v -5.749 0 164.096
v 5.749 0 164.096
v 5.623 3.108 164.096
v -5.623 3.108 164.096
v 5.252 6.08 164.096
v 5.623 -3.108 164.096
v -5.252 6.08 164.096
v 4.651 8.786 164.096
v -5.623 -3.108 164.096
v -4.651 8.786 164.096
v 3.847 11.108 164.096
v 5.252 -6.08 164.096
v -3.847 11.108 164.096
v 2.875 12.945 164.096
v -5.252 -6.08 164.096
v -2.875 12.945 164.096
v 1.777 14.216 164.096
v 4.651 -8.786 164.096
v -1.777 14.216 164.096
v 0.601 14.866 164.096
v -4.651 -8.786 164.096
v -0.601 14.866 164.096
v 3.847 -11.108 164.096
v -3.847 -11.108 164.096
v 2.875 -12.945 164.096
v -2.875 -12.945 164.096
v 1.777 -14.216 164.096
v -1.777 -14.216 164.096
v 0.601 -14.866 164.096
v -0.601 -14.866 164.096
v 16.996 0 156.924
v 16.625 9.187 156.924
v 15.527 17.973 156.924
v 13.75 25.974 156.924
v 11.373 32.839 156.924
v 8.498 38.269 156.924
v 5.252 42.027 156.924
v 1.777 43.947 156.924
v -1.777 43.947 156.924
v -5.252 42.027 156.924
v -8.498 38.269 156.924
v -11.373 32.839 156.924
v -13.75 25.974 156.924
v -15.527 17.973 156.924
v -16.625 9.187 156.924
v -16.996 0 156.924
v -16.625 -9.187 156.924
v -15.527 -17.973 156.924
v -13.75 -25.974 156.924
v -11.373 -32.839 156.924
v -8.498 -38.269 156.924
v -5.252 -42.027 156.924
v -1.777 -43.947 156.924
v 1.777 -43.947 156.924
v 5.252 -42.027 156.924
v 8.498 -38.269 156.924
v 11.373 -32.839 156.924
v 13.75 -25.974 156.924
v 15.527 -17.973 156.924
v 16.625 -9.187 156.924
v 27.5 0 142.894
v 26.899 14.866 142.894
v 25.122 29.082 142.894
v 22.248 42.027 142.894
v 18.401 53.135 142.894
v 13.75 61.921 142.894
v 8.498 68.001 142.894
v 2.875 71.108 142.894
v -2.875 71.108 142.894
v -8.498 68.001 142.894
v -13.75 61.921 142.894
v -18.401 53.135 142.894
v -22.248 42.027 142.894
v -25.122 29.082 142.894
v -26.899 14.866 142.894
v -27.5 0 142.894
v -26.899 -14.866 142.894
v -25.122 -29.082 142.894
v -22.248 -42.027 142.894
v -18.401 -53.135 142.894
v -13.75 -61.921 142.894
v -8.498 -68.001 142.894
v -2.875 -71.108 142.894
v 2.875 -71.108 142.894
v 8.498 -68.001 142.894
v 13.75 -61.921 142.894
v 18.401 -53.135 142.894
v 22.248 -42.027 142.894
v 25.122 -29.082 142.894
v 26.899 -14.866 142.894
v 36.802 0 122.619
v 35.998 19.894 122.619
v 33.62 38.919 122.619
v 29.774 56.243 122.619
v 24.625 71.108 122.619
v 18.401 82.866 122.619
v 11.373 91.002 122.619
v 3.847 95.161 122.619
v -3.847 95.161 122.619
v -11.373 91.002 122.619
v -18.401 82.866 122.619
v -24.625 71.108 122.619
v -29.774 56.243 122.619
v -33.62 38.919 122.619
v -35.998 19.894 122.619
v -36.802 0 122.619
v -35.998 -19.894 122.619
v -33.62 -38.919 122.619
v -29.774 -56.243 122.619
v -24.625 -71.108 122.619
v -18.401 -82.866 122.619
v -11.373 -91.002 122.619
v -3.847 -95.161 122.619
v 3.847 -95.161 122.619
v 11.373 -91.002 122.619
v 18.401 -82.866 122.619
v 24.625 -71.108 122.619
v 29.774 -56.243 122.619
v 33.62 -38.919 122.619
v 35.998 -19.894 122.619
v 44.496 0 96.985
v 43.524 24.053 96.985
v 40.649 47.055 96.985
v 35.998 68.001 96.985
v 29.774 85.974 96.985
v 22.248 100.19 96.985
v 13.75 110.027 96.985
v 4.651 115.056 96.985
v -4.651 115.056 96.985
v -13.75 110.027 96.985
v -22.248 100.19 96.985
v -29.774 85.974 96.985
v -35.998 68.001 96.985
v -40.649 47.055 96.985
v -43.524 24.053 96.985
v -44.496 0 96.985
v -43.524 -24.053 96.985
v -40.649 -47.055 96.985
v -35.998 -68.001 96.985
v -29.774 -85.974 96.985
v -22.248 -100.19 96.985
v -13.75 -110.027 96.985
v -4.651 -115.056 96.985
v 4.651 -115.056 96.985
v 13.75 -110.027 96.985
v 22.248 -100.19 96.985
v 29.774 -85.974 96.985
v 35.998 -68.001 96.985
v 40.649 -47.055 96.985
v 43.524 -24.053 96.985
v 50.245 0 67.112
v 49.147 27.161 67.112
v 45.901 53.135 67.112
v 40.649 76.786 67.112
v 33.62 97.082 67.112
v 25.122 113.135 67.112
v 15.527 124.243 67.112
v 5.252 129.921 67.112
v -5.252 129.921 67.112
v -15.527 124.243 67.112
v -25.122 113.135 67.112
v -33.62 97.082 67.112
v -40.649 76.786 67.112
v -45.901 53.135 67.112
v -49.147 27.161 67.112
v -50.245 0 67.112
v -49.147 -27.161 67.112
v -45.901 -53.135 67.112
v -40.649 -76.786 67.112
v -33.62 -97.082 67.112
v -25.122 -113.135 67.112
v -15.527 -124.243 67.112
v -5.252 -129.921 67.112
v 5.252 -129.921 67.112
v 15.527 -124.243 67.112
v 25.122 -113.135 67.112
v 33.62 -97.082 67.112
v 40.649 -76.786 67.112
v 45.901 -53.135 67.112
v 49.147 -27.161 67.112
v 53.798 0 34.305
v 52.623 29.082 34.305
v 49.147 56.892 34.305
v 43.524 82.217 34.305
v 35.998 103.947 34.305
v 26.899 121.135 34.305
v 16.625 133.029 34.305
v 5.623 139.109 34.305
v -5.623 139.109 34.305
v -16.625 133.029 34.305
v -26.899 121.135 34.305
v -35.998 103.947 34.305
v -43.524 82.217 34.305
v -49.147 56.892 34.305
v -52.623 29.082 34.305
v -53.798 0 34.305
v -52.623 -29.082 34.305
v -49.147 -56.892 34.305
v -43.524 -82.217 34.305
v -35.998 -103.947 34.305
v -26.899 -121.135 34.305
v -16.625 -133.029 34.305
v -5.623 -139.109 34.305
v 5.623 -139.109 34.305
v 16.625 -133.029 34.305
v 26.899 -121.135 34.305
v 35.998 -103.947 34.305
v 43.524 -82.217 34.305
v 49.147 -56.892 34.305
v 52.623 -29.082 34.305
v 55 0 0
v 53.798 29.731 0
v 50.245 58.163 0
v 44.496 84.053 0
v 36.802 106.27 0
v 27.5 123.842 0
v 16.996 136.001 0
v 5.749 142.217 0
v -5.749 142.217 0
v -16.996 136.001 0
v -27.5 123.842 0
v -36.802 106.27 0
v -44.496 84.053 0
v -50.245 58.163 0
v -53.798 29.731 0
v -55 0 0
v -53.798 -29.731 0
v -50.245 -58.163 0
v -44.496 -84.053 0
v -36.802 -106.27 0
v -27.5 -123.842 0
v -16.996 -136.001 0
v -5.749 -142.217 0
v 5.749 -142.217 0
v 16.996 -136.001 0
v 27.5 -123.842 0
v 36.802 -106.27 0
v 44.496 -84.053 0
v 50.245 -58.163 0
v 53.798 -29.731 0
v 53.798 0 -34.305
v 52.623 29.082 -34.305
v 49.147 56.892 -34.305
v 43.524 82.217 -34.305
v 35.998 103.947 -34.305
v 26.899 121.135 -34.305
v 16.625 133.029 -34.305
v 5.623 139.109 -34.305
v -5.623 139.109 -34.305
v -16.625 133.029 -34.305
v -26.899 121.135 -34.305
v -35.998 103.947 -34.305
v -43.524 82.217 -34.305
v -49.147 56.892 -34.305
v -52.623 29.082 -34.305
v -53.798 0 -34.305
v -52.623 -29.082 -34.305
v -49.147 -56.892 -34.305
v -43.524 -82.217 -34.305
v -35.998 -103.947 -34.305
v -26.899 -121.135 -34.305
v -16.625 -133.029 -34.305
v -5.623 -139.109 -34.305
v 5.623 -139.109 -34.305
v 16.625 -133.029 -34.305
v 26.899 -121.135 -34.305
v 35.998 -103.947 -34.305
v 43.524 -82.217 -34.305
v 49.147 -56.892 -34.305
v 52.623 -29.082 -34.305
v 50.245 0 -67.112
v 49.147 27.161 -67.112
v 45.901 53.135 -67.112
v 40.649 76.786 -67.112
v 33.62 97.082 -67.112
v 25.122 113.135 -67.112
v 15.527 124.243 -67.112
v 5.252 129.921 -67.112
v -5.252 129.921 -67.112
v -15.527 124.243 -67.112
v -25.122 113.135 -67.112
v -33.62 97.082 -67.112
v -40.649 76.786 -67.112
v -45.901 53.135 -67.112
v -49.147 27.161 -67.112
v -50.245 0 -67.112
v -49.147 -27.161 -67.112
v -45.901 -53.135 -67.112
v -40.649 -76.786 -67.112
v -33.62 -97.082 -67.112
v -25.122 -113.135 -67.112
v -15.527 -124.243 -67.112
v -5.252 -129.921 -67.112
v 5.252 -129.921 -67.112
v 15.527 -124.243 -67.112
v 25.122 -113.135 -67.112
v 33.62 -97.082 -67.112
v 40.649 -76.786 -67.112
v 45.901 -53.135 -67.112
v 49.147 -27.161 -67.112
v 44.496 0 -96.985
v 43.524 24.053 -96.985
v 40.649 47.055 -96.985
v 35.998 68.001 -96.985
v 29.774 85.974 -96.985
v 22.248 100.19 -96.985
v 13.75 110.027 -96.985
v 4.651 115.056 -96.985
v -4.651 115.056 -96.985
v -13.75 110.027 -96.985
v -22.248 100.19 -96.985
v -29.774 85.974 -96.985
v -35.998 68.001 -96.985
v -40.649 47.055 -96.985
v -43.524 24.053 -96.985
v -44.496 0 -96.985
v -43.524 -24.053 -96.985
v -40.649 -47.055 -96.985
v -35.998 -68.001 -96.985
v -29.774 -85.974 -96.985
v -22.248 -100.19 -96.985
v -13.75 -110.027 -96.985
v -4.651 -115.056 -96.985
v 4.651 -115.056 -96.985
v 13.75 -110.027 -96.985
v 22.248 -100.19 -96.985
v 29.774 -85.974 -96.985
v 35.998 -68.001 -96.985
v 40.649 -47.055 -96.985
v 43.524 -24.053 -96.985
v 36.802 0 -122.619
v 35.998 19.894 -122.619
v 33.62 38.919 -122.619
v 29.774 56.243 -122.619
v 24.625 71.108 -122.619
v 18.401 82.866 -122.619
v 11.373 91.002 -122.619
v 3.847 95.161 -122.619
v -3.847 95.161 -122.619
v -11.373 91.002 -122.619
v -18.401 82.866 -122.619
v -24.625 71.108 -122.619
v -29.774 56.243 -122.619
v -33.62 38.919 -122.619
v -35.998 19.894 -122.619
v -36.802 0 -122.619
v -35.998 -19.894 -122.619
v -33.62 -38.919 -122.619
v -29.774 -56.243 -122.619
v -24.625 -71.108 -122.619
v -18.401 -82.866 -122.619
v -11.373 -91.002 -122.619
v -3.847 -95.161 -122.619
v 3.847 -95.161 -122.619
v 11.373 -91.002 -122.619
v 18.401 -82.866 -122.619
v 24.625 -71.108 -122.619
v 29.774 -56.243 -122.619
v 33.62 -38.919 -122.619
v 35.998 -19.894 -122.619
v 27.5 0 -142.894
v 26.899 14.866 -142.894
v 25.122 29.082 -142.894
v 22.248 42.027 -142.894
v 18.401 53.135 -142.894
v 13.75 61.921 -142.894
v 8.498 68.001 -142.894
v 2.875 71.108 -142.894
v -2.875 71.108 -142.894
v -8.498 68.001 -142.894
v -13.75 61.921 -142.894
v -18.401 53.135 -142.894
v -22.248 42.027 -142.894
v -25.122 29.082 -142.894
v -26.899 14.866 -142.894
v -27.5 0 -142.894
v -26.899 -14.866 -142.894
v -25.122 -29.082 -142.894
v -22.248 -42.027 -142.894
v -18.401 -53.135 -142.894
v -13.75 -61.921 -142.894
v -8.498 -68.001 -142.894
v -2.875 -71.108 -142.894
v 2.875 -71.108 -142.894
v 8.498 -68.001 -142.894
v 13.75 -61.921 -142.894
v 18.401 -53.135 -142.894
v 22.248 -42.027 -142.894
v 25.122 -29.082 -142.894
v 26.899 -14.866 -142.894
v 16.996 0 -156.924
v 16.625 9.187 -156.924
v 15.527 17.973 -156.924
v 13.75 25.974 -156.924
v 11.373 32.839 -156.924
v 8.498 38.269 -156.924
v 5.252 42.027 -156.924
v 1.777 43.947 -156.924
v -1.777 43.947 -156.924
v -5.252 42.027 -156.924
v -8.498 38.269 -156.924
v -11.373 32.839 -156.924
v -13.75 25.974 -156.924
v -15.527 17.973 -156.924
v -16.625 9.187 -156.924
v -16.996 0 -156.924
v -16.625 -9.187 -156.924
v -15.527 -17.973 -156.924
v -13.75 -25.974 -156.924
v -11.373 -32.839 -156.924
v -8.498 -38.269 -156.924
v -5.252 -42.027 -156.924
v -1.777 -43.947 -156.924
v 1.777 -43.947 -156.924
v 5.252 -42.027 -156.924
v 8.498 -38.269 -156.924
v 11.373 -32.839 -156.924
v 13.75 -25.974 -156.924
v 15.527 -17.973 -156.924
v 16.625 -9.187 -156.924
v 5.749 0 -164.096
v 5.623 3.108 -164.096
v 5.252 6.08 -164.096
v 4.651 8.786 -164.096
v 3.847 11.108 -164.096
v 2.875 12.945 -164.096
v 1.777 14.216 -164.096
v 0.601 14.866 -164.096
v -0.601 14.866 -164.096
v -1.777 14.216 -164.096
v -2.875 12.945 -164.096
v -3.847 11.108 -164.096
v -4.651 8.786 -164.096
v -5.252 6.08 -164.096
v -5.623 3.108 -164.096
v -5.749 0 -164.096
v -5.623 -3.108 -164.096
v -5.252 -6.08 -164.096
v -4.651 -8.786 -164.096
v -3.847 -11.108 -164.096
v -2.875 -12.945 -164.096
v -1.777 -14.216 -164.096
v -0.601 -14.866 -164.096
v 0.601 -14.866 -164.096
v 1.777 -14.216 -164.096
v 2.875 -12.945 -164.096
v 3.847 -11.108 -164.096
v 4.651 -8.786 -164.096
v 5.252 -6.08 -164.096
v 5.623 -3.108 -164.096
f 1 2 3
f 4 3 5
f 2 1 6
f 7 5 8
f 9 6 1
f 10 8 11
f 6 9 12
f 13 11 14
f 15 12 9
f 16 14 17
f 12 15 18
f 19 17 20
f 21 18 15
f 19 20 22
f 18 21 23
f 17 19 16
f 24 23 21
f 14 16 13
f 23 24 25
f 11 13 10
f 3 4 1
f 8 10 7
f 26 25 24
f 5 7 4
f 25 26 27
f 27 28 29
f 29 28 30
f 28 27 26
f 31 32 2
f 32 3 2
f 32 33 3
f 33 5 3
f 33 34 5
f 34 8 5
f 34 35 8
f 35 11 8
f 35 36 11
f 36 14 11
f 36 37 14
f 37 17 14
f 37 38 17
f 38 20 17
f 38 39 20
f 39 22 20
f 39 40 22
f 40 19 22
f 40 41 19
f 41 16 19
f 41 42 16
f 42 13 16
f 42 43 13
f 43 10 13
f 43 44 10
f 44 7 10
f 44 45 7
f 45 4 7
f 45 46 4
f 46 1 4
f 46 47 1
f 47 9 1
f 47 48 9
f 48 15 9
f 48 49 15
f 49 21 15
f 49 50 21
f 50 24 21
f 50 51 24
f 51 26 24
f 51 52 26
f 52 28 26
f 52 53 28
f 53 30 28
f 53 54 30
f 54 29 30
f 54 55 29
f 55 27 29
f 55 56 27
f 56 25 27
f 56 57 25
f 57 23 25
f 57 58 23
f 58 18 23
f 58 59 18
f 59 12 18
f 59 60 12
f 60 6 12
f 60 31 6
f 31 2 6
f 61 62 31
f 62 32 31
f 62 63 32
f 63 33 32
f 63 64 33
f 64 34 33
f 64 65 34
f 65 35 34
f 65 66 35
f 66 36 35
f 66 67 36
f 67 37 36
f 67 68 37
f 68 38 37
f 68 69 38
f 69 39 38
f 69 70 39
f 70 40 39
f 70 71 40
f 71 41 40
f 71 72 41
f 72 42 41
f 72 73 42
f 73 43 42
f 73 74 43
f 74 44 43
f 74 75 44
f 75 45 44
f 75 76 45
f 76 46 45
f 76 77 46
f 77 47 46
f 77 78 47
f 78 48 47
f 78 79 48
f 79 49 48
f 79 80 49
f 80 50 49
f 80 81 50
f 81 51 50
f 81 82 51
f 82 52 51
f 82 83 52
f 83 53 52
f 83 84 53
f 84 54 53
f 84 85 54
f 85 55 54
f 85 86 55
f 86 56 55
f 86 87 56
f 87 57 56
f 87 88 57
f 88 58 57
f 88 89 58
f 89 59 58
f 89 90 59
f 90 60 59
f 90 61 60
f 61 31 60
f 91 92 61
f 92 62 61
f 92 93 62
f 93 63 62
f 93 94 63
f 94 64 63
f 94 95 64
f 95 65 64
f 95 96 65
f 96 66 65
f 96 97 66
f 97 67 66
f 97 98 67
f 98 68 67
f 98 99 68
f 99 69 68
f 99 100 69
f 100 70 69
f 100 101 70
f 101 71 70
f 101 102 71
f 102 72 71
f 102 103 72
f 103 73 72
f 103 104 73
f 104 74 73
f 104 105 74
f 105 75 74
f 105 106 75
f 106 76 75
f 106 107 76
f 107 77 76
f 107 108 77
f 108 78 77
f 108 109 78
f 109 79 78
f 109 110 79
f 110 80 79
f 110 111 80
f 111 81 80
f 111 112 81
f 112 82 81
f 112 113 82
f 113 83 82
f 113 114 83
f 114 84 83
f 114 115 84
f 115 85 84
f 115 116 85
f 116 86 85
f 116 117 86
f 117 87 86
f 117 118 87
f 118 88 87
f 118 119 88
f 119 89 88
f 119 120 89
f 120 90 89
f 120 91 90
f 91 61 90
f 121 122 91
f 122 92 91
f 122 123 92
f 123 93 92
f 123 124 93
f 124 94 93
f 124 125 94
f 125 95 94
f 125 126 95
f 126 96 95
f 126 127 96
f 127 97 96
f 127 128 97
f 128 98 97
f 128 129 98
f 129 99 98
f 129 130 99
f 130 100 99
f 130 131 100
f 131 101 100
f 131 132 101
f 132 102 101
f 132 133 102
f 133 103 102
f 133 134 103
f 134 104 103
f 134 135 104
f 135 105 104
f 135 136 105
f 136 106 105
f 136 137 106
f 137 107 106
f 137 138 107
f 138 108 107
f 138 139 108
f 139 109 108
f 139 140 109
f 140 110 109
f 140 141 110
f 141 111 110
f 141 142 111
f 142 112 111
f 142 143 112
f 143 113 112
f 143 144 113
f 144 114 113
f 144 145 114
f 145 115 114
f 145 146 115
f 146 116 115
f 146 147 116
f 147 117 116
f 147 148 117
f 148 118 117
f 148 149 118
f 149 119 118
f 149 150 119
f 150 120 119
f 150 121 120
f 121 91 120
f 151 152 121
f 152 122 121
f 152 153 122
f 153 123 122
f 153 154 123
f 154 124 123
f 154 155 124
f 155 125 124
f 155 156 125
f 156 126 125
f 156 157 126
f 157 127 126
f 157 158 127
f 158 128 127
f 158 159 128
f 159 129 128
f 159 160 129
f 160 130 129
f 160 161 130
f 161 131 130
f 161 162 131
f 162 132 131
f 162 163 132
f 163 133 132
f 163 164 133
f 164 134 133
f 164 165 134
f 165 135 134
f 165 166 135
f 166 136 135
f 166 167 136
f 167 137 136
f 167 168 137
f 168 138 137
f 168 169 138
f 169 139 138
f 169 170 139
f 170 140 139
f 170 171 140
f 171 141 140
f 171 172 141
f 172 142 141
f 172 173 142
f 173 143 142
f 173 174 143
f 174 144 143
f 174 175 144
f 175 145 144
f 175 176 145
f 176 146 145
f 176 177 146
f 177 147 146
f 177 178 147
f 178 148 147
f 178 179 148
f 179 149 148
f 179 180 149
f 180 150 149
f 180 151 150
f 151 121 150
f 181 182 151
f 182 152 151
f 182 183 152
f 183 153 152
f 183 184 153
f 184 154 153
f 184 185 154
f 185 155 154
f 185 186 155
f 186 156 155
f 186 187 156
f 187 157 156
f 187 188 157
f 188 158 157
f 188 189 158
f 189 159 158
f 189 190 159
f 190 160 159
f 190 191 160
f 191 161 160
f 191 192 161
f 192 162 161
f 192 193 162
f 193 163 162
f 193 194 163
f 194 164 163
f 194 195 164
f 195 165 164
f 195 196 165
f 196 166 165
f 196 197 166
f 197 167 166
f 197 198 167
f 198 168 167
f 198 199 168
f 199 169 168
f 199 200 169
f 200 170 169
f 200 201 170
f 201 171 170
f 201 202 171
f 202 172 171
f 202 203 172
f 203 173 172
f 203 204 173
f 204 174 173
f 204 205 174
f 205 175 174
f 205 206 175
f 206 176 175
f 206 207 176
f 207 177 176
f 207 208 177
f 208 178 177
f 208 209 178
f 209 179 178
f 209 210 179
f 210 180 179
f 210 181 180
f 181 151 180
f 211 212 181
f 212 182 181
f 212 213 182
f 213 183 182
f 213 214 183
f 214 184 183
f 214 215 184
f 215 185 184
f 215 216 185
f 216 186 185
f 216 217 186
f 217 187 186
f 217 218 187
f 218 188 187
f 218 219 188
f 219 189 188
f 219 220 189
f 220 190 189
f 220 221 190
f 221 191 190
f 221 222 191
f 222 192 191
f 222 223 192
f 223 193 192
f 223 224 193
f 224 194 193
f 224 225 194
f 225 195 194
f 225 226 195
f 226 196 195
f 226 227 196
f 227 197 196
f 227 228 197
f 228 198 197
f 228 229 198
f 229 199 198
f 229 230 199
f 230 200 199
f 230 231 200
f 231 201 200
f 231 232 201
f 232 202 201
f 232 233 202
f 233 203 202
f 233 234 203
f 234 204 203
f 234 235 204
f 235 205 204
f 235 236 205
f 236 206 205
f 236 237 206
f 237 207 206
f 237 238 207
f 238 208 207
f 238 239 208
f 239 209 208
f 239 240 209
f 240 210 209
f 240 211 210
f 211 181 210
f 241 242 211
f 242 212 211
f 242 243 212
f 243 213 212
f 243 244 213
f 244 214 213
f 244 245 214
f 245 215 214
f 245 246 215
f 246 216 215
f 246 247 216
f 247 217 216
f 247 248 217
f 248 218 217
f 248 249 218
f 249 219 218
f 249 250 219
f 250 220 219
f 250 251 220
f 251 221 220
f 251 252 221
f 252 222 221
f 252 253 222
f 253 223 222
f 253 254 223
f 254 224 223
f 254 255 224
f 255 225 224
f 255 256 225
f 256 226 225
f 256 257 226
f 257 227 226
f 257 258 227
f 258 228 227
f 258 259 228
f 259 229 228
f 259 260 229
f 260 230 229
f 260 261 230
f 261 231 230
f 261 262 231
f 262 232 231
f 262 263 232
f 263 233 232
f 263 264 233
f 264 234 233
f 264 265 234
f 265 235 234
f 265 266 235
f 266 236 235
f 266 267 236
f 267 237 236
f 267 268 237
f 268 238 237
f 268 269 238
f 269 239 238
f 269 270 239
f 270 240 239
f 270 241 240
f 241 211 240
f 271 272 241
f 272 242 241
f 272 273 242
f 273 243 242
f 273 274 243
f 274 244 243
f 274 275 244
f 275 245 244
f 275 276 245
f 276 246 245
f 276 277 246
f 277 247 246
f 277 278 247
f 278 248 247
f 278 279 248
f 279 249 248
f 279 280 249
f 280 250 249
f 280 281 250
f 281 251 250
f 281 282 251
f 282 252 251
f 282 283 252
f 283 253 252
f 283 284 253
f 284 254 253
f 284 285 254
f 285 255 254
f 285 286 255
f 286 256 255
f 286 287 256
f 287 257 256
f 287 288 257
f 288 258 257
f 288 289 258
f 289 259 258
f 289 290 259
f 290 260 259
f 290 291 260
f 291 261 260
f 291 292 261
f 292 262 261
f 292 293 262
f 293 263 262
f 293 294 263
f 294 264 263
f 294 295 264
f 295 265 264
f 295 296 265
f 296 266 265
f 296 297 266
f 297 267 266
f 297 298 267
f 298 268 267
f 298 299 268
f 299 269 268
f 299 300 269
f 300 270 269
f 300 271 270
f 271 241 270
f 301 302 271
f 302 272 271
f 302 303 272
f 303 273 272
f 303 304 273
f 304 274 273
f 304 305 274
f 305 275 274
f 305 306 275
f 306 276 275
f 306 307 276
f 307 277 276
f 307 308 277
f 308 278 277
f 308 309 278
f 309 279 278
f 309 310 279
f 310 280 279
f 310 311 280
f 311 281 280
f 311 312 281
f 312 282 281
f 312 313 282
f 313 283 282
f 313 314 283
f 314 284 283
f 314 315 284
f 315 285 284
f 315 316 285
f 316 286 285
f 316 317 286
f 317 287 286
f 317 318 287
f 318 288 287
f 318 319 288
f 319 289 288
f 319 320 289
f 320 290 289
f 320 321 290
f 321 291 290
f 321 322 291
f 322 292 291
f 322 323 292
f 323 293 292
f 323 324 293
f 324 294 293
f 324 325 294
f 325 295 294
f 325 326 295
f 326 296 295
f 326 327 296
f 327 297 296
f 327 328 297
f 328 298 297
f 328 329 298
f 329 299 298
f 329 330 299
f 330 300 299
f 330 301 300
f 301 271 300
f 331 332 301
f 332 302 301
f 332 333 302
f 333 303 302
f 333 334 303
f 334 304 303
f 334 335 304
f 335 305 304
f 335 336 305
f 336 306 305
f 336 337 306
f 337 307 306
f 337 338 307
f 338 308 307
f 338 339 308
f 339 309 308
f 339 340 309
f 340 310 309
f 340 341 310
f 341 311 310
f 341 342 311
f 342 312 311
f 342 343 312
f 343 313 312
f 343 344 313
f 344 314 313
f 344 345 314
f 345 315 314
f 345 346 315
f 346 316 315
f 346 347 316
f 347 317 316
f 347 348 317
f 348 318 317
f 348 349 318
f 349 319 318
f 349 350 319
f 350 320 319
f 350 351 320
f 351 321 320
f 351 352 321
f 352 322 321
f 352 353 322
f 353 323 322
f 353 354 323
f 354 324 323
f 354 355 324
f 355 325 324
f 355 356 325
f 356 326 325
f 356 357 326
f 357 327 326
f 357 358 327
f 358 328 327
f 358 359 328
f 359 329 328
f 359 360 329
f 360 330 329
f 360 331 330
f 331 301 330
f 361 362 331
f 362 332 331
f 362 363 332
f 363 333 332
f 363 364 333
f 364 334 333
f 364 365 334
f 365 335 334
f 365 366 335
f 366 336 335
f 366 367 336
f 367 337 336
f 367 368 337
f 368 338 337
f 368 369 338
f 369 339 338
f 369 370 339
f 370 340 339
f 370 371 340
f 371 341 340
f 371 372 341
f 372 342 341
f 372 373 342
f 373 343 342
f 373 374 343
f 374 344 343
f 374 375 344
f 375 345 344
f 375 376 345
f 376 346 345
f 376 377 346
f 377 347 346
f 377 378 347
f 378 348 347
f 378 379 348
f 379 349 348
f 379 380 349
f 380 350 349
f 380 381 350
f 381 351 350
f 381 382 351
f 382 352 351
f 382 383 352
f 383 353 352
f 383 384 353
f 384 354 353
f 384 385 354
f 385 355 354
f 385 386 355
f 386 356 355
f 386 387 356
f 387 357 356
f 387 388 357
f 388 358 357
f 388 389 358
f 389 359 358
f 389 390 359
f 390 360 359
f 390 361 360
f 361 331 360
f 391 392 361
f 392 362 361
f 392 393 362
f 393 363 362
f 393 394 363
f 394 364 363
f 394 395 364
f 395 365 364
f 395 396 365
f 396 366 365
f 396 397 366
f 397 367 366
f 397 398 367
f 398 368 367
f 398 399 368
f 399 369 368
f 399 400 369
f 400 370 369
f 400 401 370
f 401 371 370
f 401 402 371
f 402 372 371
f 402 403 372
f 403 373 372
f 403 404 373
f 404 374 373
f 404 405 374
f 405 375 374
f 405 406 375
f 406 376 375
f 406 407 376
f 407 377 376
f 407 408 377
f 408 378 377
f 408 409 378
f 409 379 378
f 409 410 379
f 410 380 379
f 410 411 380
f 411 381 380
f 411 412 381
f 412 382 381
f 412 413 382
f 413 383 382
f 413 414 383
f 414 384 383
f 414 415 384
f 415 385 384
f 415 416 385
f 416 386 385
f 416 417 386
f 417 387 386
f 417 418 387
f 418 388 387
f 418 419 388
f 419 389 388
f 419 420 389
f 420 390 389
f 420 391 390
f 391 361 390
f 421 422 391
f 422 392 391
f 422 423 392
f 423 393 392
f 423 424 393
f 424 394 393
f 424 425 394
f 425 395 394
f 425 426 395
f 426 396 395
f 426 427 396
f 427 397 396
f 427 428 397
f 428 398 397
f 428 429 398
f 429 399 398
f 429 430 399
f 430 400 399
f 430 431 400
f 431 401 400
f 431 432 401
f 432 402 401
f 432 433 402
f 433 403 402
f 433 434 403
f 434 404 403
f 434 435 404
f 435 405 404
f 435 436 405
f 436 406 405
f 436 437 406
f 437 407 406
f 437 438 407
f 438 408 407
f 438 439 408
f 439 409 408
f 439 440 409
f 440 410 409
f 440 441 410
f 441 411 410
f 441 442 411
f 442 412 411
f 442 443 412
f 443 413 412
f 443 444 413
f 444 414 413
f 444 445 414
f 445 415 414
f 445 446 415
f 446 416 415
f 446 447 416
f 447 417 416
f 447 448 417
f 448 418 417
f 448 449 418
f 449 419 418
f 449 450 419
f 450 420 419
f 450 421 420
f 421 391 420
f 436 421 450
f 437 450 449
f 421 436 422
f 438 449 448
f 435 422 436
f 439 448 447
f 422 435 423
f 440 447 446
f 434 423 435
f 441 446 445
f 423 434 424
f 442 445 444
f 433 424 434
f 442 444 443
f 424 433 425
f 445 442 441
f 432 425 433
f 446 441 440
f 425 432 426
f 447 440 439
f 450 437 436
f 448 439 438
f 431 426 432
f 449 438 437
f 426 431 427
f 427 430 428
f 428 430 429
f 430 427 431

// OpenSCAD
// Generated by SolidPython 1.0.1 on 2020-07-29 00:46:46


scale(v = [5, 13, 15]) {
	sphere(r = 11);
}
/***********************************************
*********      SolidPython code:      **********
************************************************
 
# import packages: SolidPython
from solid import *
from solid.utils import *
from itertools import chain, combinations, permutations


class Resize:

    def __init__(self, scad_file):
        self.scad_file = scad_file
        #self.scad_file = import_scad(scad_file)
        # cone/cylinder param:
        self.r1 = 0
        self.r2 = 0
        self.h = 0
        # rectangular prism param:
        self.w = 0
        self.l = 0
        # ellipse param:
        self.r = 0

    # import OpenScad code (file name corresponds to shape)


    # classify shape + parameters
    def assign(self, param1, param2, param3):
        if self.scad_file == 'cone.scad':
            self.r1 = param1
            self.r2 = param2
            self.h = param3
        elif self.scad_file == 'cylinder.scad':
            self.r1 = param1
            self.r2 = param2
            self.h = param3
        elif self.scad_file == 'rectangularPrism.scad':
            self.h = param1
            self.l = param2
            self.w = param3
        else:
            self.r = param1
            self.h = param2

    # resize parameters
    def iterate(self):
        x = range(3, 20, 2)
        i = 1
        if self.scad_file == 'cone.scad':
            tempList = list(permutations(x, 2))
            for temp in tempList:
                param1 = temp[0]
                param2 = temp[1]
                filepath = 'produced_scad_files/' + 'cone' + str(param1) + '_' + str(param2) + '_' + '.scad'
                scad_render_to_file(cylinder(h=param1, r1=param2, r2=0), filepath)

        elif self.scad_file == 'cylinder.scad':
            tempList = list(permutations(x, 3))
            for temp in tempList:
                param1 = temp[0]
                param2 = temp[1]
                filepath = 'produced_scad_files/' + 'cylinder' + str(param1) + '_' + str(param2) + '_' + '.scad'
                scad_render_to_file(cylinder(h=param1, r1=param2, r2=param2), filepath)

        elif self.scad_file == 'rectangularPrism.scad':
            tempList = list(permutations(x, 3))
            for temp in tempList:
                param1 = temp[0]
                param2 = temp[1]
                param3 = temp[2]
                filepath = 'produced_scad_files/' + 'rectangularPrism' + str(param1) + '_' + str(param2) + '_' + str(
                    param3) + '.scad'
                scad_render_to_file(cube(size=(param1, param2, param3)), filepath)

        elif self.scad_file == 'ellipse.scad':
            tempList = list(permutations(x, 4))
            for temp in tempList:
                param1 = temp[0]
                param2 = temp[1]
                param3 = temp[2]
                param4 = temp[3]
                filepath = 'produced_scad_files/' + 'ellipse' + str(param1) + '_' + str(param2) + '_' + str(param3) + '_' + str(param4) + '.scad'
                scad_render_to_file(scale([param1, param2, param3])(sphere(r=param4)), filepath)

    def render_to_scadfile(self):
        scad_render_to_file(scad, 'example.scad') 
 
************************************************/
